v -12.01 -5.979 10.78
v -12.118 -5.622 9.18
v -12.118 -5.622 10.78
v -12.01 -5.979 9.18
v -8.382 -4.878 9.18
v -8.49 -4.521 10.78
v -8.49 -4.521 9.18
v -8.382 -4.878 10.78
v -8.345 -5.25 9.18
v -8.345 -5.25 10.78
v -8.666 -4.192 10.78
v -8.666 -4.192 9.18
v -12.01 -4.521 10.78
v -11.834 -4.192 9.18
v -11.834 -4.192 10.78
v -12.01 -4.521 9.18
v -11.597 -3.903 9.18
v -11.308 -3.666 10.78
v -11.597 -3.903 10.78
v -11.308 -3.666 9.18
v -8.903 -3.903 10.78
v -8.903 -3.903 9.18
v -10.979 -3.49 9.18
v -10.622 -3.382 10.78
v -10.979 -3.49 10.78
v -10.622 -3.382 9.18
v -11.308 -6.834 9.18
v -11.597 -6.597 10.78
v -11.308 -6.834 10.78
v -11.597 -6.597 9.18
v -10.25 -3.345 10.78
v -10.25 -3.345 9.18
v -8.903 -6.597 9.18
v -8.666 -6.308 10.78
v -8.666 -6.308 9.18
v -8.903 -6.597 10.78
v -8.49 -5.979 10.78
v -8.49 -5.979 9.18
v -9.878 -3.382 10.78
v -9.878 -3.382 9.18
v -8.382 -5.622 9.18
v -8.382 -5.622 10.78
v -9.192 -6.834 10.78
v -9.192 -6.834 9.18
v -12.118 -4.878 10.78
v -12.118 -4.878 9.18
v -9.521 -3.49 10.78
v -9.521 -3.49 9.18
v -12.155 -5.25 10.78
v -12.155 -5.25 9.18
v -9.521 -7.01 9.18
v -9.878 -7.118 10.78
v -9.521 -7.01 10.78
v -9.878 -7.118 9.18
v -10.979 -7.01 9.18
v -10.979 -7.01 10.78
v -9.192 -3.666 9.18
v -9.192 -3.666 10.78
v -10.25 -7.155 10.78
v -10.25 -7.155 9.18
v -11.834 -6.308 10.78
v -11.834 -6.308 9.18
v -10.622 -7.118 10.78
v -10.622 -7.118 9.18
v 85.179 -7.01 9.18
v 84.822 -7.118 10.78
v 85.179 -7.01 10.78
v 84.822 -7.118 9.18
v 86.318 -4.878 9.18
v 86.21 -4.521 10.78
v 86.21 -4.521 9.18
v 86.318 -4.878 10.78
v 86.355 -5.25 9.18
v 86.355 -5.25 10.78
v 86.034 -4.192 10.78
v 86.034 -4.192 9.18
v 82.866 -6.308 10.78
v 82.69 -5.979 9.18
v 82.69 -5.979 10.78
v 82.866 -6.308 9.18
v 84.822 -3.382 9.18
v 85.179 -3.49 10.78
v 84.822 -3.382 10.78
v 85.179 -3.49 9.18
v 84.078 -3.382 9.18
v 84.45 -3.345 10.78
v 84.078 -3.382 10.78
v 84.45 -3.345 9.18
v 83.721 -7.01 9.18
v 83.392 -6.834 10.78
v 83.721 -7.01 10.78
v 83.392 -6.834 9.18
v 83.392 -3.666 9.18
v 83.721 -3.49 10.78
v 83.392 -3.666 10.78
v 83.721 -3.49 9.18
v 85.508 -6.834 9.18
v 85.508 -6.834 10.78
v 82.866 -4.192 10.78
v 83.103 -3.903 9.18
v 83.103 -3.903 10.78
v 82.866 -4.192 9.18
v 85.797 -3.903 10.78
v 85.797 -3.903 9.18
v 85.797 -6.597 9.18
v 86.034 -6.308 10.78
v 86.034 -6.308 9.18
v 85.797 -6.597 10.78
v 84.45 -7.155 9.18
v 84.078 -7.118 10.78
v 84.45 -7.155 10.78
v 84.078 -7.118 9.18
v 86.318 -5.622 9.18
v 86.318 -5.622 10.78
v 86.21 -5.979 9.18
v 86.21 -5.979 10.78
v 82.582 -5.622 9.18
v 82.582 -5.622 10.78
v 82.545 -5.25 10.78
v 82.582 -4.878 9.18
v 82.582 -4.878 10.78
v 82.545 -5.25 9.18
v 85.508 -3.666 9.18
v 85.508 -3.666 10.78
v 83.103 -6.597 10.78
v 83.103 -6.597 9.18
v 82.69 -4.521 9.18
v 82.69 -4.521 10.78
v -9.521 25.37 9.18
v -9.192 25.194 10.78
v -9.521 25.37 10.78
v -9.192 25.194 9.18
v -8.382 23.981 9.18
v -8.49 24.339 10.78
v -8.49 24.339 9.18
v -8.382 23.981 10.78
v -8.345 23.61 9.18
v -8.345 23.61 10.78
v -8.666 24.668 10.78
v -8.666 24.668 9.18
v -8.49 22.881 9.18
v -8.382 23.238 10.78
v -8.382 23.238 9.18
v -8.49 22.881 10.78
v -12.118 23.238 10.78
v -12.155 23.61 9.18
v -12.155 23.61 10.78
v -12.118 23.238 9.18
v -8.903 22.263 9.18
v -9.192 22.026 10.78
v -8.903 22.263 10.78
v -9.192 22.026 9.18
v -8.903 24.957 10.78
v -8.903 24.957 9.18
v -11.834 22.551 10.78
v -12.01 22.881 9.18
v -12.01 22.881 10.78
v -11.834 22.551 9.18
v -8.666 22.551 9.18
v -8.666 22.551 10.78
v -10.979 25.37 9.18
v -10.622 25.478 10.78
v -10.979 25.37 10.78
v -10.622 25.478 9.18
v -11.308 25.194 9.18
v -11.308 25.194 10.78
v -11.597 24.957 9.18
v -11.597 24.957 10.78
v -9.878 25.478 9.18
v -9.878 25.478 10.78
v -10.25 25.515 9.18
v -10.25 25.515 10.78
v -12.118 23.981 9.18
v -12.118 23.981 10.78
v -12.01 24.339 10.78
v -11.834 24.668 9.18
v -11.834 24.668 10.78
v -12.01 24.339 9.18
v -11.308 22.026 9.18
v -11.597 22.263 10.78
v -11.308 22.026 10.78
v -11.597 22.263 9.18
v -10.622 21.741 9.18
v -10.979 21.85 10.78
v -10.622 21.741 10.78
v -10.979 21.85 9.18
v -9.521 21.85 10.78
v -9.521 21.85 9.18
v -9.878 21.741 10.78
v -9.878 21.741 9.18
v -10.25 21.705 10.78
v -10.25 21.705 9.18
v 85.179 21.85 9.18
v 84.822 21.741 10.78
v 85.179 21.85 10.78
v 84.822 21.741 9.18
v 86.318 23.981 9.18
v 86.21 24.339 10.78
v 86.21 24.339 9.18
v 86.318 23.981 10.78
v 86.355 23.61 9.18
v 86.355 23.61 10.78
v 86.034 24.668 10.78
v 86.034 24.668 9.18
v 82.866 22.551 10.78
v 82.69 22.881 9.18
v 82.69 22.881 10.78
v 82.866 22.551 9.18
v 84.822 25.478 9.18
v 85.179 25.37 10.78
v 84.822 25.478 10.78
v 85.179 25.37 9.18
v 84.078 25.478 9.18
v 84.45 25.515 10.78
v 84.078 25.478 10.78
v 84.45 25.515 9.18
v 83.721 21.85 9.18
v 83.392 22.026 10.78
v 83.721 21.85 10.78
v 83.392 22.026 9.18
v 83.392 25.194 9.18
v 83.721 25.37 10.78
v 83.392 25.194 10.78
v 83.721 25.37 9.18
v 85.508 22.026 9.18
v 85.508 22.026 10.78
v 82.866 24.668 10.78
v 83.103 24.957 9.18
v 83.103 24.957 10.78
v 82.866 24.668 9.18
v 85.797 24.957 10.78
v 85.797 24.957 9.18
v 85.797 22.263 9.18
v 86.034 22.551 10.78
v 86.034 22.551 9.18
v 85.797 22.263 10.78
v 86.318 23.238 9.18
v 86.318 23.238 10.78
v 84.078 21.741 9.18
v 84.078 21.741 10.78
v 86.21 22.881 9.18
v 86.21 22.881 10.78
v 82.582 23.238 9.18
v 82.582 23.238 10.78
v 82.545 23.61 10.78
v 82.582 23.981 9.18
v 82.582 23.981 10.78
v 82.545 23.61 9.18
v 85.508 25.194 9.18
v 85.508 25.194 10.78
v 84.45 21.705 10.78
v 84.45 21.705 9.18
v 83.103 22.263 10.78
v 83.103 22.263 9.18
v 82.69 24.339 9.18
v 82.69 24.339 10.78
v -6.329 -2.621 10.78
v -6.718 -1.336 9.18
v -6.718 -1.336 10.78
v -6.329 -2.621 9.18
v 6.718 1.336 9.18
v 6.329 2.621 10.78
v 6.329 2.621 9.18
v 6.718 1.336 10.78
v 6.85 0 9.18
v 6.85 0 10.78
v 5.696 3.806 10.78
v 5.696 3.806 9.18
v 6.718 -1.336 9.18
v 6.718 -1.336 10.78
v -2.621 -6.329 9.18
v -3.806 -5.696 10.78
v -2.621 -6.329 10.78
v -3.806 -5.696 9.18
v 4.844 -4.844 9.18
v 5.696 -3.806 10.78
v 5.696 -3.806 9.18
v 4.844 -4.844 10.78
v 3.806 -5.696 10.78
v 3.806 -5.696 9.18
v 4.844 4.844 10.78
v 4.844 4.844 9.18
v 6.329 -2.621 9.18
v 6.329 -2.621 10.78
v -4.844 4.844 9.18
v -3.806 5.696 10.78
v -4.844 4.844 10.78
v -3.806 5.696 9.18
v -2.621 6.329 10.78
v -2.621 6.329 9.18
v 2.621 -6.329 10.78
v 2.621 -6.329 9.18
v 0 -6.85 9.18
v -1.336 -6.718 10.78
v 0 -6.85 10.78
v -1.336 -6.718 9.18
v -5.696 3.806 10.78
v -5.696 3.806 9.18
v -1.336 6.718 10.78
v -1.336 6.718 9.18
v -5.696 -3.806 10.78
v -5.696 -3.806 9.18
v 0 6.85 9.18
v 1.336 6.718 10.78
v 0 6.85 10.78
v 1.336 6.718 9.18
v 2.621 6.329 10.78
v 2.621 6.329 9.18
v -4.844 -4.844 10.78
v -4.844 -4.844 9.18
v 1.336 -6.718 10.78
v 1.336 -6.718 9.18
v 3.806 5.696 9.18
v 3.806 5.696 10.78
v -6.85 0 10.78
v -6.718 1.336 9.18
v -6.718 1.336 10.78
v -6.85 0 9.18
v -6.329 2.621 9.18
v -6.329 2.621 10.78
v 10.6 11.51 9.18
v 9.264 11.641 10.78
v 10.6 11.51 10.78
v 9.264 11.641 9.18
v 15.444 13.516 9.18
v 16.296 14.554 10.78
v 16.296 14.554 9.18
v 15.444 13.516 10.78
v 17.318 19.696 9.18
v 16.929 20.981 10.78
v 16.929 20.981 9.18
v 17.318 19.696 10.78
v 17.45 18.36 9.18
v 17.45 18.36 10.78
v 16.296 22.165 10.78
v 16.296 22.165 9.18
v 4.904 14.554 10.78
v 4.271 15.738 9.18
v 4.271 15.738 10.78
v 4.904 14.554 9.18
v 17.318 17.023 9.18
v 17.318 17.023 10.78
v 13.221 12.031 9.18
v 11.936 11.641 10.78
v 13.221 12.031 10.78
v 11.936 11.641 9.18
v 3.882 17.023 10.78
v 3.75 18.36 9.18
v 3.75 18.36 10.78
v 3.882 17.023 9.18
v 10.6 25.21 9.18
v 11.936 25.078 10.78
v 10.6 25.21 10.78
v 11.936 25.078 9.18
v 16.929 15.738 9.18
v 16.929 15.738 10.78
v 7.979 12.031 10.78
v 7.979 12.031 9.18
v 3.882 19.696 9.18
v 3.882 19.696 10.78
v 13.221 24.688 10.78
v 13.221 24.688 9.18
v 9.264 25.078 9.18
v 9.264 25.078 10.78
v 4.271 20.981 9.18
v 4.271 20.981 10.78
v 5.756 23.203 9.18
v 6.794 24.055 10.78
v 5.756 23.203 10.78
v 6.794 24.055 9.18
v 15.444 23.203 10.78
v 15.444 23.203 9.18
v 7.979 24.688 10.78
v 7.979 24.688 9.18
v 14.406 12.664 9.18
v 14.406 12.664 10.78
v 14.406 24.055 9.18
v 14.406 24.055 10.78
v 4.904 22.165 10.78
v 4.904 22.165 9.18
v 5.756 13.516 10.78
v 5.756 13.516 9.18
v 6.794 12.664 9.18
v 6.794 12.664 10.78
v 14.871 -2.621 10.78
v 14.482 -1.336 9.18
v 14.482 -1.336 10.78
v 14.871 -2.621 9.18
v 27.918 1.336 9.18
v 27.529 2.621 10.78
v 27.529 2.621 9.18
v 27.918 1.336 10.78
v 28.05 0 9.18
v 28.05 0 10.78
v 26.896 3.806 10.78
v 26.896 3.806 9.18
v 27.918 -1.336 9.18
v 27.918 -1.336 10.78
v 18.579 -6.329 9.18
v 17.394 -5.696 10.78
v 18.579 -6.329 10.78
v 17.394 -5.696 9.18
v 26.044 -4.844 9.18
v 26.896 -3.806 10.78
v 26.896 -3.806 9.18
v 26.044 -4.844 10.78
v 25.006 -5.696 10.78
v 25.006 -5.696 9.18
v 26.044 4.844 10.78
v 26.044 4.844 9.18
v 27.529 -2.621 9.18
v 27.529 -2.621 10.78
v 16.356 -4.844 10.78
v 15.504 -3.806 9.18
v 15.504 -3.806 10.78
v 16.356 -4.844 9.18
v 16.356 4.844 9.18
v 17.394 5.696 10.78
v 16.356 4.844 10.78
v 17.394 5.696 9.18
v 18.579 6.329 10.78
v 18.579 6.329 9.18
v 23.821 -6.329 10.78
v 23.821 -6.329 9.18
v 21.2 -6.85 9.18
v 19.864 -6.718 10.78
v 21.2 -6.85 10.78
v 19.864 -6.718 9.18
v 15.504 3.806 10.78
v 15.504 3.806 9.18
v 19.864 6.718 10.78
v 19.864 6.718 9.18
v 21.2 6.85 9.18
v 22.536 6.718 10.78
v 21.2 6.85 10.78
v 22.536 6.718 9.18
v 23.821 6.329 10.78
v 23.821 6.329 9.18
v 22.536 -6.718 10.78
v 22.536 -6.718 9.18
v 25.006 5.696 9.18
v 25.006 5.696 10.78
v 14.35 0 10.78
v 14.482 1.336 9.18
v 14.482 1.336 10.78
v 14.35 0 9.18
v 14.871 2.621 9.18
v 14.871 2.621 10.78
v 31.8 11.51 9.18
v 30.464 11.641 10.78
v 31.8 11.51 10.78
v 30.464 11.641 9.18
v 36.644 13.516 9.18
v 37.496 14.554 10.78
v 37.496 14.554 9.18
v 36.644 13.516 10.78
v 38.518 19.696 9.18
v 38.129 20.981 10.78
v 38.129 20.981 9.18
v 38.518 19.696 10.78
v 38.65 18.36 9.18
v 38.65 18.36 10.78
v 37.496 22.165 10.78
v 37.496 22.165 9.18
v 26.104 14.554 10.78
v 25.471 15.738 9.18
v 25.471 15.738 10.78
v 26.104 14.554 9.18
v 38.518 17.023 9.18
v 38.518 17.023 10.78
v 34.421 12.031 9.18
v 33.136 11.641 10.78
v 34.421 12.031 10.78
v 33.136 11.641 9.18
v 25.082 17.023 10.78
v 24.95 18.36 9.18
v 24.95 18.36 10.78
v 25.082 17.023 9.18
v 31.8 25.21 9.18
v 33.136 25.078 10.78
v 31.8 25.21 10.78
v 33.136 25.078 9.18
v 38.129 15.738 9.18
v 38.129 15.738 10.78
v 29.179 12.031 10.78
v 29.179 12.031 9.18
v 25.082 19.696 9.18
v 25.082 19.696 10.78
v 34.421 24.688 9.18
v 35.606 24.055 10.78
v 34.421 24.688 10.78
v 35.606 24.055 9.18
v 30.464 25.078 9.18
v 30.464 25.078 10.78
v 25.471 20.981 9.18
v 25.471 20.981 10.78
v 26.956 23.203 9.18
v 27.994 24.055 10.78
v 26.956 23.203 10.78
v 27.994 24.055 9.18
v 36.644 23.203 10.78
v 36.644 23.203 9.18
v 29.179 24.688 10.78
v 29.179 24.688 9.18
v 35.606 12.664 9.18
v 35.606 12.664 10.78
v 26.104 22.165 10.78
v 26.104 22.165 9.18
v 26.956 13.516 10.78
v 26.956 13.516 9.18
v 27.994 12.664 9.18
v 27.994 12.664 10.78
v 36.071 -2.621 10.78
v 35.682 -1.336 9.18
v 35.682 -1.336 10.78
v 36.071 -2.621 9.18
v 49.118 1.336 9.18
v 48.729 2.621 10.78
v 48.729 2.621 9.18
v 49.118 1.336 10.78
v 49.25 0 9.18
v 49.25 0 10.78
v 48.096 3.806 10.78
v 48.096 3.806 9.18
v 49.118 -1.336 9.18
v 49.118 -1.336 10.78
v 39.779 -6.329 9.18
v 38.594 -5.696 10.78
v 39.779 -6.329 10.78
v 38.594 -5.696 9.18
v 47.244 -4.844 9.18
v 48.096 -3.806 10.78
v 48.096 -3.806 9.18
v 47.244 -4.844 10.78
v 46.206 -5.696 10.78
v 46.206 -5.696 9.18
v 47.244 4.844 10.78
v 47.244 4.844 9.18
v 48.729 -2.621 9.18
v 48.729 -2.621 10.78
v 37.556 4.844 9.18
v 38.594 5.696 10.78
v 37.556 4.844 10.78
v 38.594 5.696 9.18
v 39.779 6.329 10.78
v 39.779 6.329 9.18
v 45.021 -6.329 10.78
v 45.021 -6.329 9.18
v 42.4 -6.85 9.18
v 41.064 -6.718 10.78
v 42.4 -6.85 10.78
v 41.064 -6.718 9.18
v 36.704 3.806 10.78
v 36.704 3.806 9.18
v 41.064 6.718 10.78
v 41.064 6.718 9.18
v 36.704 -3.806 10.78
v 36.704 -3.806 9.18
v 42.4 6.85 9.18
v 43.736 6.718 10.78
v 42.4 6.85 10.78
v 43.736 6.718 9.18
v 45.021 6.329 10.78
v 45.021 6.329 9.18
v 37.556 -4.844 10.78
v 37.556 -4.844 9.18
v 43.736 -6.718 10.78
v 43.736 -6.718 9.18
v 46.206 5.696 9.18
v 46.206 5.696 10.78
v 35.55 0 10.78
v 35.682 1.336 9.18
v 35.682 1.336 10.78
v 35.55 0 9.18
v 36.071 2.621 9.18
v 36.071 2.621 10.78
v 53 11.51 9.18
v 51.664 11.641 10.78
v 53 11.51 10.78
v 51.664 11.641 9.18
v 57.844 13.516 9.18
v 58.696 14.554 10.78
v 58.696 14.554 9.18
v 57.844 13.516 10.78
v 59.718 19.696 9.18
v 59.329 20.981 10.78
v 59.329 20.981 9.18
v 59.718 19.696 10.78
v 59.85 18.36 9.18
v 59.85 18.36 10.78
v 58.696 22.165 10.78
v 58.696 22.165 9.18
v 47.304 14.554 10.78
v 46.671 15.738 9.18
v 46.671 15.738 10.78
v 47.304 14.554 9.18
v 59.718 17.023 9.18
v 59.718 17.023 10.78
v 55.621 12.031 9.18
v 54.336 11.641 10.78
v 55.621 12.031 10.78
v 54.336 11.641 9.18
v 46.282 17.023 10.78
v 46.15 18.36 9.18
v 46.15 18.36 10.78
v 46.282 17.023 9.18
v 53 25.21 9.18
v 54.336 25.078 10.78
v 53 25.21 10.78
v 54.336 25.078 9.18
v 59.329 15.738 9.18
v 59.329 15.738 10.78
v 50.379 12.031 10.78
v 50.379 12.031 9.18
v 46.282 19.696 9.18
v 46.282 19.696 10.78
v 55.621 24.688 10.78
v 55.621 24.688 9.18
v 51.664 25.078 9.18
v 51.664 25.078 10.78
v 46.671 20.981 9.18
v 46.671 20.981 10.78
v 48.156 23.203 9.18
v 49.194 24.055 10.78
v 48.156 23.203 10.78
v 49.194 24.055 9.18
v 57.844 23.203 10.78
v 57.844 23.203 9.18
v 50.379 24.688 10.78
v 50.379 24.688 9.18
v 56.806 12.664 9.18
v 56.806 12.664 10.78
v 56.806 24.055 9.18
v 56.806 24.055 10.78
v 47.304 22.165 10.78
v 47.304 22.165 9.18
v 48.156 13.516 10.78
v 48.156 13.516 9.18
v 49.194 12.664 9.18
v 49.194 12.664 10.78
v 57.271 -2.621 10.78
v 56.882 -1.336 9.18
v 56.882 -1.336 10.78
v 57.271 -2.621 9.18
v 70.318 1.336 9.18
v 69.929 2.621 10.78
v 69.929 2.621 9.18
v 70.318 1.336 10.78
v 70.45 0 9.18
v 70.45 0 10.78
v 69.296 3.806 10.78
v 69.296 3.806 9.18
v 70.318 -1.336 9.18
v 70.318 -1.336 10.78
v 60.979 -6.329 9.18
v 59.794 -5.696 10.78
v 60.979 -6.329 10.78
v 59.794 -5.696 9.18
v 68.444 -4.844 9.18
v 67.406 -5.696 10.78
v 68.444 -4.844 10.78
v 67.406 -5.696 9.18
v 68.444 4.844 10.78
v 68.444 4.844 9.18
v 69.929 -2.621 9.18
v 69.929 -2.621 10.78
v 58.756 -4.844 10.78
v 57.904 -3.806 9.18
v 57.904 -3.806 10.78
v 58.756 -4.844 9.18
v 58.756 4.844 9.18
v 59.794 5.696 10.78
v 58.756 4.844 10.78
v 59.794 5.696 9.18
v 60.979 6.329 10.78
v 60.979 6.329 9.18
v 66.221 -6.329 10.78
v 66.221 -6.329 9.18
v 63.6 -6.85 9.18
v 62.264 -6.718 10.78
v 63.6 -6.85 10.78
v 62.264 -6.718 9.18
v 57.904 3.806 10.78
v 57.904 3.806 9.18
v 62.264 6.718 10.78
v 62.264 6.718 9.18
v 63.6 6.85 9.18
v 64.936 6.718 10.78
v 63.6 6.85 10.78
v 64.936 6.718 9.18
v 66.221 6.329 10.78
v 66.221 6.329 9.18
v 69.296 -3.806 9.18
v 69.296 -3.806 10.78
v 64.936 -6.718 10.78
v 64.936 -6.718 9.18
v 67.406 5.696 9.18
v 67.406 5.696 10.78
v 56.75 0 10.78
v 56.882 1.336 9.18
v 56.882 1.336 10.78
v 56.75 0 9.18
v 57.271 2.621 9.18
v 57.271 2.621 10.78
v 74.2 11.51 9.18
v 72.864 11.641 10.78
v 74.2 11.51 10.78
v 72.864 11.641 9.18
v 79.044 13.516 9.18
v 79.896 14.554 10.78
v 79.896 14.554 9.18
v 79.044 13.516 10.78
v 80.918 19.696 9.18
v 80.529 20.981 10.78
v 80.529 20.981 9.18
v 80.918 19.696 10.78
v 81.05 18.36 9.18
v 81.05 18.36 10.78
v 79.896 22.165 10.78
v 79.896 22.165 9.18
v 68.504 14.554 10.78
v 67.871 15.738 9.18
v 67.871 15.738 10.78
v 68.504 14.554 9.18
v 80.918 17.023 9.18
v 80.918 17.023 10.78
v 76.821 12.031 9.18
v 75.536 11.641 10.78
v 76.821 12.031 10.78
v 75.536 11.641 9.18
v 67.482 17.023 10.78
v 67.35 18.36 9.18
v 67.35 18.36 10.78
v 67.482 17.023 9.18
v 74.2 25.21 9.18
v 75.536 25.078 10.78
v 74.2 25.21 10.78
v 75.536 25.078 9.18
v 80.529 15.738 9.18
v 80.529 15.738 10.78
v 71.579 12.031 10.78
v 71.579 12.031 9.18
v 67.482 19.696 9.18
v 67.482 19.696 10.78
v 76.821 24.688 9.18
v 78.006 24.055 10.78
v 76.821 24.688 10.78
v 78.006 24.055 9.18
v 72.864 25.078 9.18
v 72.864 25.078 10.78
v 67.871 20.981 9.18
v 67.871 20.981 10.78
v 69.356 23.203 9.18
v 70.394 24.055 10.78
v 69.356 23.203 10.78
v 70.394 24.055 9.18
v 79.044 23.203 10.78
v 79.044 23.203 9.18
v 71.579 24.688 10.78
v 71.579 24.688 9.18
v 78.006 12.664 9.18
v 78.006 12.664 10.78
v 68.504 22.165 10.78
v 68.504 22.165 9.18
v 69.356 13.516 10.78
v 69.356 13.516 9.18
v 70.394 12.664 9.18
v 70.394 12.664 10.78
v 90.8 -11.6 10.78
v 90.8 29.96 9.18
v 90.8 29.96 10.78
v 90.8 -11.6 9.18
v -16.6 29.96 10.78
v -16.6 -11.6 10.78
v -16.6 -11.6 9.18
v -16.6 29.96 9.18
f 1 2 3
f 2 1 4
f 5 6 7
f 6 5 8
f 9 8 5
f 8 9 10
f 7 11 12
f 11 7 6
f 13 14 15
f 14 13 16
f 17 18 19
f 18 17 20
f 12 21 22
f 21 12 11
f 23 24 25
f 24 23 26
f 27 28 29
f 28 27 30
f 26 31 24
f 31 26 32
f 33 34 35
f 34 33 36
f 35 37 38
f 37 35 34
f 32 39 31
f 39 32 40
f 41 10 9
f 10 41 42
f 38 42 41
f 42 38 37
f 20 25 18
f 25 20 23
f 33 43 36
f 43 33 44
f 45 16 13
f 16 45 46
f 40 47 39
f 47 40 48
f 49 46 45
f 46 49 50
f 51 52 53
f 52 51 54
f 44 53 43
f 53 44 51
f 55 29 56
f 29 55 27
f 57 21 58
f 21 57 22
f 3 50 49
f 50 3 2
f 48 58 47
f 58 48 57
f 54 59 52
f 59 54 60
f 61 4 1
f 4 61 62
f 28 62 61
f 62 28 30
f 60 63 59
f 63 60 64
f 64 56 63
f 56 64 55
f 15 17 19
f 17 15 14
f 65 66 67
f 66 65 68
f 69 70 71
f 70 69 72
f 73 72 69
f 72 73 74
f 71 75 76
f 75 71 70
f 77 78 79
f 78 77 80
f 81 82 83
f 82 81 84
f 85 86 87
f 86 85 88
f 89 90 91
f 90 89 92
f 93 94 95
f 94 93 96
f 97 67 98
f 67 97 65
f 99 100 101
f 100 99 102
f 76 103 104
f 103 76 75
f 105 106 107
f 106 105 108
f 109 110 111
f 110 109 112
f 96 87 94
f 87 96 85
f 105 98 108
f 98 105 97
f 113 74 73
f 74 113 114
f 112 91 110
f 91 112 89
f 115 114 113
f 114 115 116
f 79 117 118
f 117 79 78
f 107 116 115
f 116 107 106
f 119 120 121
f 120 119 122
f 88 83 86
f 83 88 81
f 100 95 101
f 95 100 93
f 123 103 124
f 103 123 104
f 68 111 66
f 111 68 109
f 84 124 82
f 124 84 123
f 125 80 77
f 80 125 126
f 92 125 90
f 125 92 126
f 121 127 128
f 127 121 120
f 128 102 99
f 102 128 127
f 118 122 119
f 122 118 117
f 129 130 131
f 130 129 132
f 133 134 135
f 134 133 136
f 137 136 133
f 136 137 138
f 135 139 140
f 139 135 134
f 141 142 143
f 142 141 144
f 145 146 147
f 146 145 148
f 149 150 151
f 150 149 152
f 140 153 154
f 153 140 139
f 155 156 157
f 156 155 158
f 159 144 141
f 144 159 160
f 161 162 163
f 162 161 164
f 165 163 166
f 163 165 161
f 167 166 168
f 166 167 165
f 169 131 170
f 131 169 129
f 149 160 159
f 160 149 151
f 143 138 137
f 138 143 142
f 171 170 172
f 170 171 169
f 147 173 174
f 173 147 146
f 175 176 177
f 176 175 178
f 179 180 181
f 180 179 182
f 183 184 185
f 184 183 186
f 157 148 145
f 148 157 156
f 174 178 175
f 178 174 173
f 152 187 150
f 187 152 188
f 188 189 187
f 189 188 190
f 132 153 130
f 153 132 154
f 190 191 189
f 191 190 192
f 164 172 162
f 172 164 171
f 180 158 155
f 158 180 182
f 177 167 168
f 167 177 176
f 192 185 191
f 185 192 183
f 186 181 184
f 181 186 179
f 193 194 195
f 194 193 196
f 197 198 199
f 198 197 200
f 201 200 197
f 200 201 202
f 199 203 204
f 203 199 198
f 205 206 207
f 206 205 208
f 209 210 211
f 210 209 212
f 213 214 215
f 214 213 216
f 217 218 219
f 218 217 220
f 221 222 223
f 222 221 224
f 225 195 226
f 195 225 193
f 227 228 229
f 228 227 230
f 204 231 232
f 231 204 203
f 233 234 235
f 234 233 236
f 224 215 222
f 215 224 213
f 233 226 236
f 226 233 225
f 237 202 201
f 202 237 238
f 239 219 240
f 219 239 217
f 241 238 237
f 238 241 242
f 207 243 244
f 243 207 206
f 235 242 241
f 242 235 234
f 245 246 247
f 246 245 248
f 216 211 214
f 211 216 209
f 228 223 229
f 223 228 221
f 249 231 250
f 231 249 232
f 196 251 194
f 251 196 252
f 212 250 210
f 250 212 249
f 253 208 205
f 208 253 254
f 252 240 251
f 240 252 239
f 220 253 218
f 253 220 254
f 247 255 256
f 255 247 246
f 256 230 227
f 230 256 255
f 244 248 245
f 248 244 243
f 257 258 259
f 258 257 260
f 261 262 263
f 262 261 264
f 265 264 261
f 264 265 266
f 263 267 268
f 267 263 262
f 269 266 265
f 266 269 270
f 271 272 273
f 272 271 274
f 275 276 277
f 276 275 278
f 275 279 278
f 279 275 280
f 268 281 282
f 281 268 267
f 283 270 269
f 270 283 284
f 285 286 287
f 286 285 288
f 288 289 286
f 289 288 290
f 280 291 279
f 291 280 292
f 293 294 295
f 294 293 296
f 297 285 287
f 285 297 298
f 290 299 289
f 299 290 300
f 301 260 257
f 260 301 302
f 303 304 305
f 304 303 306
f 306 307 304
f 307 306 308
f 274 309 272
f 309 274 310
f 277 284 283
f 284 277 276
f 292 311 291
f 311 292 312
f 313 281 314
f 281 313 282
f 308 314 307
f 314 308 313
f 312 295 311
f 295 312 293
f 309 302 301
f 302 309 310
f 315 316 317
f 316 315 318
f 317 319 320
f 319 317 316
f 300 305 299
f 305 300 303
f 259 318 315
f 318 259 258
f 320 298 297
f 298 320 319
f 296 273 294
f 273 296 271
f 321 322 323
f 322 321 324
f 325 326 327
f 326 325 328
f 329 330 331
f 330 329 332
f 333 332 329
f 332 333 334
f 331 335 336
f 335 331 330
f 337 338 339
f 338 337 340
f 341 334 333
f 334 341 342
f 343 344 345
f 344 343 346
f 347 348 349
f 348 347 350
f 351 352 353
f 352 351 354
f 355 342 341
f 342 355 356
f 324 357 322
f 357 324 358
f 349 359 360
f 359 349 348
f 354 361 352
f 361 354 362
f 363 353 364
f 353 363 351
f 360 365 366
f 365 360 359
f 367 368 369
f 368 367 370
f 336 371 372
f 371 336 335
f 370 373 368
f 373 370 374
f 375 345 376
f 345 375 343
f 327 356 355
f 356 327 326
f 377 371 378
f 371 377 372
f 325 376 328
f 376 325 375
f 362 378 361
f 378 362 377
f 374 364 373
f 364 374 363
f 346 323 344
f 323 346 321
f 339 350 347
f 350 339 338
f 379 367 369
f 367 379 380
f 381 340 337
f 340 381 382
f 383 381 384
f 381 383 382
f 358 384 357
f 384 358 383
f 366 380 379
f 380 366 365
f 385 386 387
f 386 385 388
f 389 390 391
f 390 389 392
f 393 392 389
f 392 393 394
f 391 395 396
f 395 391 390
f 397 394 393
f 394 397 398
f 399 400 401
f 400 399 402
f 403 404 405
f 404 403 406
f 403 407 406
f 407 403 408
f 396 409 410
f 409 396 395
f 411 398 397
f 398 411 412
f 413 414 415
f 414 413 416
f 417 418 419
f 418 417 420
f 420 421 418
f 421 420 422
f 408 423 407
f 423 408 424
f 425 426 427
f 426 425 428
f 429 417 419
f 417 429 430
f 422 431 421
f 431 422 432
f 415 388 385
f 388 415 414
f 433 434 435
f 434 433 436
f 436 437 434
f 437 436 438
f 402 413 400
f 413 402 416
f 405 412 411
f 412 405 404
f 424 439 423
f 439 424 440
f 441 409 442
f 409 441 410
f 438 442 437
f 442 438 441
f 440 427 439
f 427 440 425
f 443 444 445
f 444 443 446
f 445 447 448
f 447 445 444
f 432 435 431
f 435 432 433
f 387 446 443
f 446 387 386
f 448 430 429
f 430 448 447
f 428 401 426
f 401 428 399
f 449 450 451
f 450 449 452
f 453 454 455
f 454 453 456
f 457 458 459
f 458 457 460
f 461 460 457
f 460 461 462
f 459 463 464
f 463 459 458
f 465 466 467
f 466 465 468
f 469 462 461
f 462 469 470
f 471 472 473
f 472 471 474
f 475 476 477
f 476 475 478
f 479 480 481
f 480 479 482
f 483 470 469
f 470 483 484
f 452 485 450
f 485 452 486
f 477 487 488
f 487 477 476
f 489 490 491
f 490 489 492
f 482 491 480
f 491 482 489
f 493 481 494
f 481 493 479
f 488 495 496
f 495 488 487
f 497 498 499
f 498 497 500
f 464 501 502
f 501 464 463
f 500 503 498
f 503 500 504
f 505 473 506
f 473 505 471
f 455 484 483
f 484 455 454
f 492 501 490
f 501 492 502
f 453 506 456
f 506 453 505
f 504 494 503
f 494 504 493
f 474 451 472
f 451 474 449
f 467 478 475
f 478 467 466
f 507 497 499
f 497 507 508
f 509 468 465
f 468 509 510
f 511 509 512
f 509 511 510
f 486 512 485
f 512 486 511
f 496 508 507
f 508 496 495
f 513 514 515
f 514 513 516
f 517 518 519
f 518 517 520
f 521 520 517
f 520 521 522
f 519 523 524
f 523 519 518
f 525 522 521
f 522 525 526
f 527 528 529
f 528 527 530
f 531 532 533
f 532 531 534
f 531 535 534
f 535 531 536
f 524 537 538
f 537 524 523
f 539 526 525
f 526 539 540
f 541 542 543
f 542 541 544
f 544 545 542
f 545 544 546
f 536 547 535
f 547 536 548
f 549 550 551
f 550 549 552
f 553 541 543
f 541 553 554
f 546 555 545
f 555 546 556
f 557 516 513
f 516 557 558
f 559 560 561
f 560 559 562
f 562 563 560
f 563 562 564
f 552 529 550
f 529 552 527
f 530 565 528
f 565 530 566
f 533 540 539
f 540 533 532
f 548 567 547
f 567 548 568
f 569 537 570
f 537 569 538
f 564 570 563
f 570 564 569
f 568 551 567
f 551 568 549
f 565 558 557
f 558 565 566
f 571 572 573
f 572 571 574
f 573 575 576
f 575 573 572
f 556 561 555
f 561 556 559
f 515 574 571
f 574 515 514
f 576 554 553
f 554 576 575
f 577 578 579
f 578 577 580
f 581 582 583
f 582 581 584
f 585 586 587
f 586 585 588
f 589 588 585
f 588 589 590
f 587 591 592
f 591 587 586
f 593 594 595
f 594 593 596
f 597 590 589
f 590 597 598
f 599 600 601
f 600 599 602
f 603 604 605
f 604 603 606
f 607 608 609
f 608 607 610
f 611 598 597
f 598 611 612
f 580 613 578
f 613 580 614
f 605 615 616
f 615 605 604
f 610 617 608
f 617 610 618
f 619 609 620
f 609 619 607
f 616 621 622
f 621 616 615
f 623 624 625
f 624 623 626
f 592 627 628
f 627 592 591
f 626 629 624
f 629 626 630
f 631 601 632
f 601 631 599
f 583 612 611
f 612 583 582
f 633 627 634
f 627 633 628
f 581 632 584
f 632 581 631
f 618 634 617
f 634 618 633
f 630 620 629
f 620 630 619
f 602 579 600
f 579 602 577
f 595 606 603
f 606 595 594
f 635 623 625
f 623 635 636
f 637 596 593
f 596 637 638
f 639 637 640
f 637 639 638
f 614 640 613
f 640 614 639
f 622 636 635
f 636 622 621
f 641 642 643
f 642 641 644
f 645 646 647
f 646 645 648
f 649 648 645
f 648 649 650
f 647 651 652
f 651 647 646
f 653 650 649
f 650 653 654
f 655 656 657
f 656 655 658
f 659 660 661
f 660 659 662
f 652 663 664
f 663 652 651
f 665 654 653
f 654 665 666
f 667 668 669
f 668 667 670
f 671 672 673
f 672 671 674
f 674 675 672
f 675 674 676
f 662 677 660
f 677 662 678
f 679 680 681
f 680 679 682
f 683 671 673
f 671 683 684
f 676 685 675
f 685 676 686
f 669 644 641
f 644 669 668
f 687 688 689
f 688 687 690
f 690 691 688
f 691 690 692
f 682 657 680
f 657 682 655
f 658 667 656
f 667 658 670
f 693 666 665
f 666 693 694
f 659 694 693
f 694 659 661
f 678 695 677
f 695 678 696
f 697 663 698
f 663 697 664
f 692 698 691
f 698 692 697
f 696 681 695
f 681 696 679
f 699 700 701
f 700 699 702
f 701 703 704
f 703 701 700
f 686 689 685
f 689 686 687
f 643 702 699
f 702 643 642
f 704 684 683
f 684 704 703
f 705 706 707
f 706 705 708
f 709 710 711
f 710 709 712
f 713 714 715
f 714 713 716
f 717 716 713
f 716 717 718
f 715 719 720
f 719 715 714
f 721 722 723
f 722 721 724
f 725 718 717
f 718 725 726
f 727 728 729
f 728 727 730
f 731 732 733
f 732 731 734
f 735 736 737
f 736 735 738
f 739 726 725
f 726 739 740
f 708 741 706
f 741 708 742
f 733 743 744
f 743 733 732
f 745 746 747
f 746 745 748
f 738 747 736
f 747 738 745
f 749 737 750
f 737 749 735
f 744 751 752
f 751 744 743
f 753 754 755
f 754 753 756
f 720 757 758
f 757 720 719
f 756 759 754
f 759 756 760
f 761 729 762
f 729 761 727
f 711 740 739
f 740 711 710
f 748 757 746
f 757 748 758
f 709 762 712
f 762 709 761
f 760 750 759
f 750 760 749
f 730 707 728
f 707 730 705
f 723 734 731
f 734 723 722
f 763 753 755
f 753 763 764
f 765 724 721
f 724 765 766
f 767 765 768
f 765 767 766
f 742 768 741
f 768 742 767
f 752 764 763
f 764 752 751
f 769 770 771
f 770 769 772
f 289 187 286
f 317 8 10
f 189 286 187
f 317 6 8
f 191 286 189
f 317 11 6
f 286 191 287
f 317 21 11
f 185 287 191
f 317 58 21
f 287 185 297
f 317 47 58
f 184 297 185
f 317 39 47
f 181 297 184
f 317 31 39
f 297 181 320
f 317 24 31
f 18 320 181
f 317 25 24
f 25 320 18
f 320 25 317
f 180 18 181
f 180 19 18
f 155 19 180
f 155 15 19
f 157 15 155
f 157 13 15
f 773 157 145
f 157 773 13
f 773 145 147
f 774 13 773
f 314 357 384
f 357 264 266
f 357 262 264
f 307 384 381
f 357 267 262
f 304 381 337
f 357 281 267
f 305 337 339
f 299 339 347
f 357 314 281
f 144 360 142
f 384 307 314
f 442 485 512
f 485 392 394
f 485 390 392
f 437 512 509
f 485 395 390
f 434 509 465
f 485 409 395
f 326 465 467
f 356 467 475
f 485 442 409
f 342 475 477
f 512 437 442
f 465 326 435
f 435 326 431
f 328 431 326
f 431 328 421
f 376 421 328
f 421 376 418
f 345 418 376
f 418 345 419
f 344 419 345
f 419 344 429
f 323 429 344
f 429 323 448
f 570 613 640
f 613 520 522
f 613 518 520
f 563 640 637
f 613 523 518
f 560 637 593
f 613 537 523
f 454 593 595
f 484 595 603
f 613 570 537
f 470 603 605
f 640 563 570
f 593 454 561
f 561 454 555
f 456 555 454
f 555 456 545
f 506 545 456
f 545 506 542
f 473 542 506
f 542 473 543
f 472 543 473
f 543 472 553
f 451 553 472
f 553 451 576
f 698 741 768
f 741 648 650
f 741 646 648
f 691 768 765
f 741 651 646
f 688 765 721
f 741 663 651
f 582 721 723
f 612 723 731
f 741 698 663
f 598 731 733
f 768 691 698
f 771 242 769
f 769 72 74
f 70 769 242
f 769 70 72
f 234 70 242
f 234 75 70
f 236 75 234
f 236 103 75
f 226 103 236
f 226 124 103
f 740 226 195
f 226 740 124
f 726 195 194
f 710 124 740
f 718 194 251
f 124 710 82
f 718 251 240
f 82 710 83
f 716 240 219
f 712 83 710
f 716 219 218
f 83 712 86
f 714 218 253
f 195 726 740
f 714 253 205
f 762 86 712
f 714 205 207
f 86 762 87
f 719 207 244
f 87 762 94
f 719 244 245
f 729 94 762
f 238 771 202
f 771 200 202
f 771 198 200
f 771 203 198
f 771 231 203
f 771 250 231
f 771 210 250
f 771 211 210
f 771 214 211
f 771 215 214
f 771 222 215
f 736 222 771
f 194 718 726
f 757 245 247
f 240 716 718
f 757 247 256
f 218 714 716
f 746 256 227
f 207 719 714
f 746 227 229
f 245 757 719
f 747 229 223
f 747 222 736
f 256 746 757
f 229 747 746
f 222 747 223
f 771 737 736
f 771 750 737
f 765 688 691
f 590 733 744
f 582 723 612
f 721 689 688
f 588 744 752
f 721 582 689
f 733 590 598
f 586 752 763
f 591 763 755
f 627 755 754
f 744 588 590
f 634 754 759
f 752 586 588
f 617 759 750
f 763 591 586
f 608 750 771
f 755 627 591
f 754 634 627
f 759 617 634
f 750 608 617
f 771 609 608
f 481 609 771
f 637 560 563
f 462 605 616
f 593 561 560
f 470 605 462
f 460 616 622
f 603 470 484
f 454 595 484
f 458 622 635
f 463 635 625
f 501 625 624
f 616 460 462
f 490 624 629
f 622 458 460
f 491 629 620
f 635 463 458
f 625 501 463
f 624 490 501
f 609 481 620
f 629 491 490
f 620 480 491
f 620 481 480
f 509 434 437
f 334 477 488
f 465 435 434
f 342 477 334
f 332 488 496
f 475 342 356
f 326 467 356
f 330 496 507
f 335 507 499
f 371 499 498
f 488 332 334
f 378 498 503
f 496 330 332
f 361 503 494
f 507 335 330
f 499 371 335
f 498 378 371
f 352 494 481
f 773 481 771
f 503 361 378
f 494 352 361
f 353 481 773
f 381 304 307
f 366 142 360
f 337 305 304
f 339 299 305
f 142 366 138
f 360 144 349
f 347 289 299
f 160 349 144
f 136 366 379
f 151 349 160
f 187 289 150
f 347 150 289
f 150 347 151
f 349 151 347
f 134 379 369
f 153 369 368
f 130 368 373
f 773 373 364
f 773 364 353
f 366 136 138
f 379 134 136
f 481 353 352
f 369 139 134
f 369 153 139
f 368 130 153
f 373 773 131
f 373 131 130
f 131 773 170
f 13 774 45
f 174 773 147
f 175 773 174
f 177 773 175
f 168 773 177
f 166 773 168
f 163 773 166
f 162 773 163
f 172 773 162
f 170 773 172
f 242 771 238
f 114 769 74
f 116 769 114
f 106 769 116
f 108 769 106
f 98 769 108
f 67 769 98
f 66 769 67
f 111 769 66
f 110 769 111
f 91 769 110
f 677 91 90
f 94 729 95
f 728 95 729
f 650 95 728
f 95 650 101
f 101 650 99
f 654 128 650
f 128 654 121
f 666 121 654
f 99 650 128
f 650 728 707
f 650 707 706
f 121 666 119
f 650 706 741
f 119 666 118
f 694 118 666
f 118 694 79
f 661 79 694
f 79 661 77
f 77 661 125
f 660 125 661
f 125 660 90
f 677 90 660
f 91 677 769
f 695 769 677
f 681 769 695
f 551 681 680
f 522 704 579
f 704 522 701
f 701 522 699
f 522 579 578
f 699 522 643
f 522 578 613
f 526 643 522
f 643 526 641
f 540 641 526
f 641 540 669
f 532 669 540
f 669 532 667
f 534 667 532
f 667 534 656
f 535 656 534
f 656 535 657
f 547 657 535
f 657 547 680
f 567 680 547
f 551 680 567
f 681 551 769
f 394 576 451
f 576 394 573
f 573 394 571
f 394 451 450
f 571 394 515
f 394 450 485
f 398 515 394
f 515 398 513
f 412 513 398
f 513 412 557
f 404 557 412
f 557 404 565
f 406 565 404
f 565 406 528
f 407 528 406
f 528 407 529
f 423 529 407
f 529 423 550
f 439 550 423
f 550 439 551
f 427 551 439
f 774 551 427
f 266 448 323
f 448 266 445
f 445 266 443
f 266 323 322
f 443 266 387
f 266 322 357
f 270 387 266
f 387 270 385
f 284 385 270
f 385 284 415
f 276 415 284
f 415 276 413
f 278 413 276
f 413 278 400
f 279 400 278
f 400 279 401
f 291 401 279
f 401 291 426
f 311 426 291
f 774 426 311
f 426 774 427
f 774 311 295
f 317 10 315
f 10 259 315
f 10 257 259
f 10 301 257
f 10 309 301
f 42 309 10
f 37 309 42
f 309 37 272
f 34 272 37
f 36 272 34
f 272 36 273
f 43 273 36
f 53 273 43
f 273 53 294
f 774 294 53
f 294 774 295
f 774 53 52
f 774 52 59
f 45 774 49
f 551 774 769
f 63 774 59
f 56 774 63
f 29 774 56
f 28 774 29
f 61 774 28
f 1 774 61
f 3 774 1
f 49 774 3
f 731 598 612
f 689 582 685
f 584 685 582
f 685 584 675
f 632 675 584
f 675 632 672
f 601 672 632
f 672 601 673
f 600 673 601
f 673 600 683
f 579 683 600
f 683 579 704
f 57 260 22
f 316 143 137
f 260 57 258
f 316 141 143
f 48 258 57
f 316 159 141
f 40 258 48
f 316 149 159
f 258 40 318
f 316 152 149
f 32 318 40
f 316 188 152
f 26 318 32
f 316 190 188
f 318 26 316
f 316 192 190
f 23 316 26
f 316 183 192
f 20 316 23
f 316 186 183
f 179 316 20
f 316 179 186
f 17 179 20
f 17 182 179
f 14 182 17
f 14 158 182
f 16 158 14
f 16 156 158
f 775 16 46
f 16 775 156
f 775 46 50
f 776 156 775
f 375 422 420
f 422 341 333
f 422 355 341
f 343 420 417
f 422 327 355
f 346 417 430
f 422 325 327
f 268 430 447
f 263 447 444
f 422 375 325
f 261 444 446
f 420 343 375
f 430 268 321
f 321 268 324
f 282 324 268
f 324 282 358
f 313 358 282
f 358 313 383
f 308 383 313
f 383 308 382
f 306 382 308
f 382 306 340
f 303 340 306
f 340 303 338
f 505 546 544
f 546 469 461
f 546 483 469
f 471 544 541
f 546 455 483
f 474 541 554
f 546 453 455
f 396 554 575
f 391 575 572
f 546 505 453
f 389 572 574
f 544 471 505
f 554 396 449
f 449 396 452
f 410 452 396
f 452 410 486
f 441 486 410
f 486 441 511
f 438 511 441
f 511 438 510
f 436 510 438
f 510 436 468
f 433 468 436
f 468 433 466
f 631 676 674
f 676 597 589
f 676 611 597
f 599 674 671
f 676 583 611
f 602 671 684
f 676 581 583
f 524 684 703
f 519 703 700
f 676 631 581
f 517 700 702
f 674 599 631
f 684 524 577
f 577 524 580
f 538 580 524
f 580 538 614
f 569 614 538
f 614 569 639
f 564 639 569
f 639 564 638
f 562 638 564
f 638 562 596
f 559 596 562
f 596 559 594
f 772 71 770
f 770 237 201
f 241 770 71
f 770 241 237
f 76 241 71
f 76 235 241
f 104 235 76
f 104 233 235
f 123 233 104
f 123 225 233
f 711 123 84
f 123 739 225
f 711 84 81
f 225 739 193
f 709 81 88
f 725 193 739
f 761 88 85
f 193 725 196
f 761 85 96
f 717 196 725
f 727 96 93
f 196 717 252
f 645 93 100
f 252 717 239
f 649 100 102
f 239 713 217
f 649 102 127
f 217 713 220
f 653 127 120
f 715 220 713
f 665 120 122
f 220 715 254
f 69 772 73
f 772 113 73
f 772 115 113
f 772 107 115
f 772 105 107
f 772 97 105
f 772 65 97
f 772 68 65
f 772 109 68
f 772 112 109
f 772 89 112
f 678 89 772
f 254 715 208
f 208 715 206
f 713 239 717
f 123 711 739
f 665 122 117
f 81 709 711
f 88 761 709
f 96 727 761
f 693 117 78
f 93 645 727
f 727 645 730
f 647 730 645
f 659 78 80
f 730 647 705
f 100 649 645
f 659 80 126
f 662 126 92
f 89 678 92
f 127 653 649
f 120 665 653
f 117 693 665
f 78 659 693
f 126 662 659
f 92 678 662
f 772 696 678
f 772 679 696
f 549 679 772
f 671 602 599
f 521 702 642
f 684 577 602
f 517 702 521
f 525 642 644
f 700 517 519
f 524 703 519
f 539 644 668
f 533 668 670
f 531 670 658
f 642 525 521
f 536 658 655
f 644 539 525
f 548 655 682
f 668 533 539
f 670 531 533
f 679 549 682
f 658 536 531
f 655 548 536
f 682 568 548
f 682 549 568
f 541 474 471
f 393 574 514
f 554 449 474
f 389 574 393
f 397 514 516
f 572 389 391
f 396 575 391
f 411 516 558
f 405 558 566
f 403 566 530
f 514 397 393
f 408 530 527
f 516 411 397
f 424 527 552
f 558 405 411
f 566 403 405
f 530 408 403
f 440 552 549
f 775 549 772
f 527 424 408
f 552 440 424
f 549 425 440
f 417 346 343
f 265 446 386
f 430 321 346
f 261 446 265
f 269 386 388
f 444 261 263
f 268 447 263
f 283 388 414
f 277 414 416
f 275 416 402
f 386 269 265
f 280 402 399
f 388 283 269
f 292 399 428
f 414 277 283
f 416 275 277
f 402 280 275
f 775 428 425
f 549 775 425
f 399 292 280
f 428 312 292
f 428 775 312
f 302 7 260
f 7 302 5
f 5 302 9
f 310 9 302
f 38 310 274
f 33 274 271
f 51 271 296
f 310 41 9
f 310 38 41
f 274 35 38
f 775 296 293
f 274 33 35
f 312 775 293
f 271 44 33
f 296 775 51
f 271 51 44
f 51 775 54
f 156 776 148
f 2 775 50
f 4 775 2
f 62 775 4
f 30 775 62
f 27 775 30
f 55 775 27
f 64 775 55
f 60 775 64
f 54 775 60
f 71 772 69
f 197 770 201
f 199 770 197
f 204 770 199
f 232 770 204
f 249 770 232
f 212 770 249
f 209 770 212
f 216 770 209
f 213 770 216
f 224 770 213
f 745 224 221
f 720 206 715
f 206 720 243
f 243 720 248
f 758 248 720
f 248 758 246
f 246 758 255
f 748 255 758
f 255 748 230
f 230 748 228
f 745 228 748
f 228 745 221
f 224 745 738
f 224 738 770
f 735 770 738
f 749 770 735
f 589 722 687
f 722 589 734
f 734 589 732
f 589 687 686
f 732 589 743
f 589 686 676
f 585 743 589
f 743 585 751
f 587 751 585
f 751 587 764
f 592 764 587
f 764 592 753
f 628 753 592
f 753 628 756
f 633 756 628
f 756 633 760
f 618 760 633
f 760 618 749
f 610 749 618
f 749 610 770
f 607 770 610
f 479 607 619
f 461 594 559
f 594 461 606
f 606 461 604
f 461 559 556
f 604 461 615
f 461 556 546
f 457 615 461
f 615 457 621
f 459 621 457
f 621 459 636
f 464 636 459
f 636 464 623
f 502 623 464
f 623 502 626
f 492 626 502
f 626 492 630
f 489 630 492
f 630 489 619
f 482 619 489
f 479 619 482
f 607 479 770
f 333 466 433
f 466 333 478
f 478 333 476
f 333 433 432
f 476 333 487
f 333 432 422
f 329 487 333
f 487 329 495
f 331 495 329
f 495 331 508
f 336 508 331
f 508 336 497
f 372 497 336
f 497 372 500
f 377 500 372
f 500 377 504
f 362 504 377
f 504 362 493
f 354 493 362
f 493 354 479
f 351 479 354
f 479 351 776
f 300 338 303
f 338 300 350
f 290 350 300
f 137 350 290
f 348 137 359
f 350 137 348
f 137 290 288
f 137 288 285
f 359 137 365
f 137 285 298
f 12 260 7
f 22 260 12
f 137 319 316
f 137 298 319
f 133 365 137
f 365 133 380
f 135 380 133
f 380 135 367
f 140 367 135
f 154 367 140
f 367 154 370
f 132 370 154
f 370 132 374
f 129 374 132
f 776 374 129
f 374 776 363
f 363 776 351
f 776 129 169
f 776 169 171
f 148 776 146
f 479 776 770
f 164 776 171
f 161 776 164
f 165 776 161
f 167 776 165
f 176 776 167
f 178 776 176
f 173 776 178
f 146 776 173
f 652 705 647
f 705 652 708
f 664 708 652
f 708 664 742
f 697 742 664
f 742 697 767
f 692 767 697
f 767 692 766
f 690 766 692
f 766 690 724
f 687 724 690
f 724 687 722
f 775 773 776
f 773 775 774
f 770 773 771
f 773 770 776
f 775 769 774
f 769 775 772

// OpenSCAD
//
// holder for components in 8 stage CW
//

mm = 25.4;
e = 0.1;
$fn = 32;

s32 = sqrt(3)/2;

cap_d = 13.2;
cap_spc = 0.25;
hole_d = cap_d+2*cap_spc;

mtg_hole_d = 0.15*mm;
mtg_hole_off = 0.25*mm;

cap_dx = cap_d+8;
cap_h = cap_dx*s32;

nstage = 4;

module cap( dia) {
     color("#404040")
	  cylinder( h=cap_h, d=dia);
}


module cyl_array( dia) {
     for( i=[0:nstage-1] ) {
	  translate( [cap_dx*i, 0, 0]) {
	       cap( dia);
	       translate( [cap_dx/2, cap_h , 0]) cap( dia);
	  }
     }
}

module m_hole_at( x, y, d) {
     translate( [x, y, 0])
	  cylinder( h=cap_h, d=mtg_hole_d);
}


bbx = 10;			/* board border in x */
bby = 5;			/* board border in y */

board_x = 2*bbx+cap_d + (nstage-0.5)*cap_dx;
board_y = 2*bby+cap_d+cap_h;
board_thk = 1.6;

module board() {

     difference() {
	  translate( [-cap_d/2-bbx, -cap_d/2-bby, cap_h/2]) {
	       cube( [board_x, board_y, board_thk]);
	  }
	  translate( [-cap_d/2-bbx, -cap_d/2-bby, -e]) {
	       m_hole_at( mtg_hole_off, mtg_hole_off, mtg_hole_d);
	       m_hole_at( board_x-mtg_hole_off, mtg_hole_off, mtg_hole_d);
	       m_hole_at( mtg_hole_off, board_y-mtg_hole_off, mtg_hole_d);
	       m_hole_at( board_x-mtg_hole_off, board_y-mtg_hole_off, mtg_hole_d);
	  }
	  cyl_array( hole_d);
     }
}

// cyl_array( cap_d);
//projection() {
     board();
//}
